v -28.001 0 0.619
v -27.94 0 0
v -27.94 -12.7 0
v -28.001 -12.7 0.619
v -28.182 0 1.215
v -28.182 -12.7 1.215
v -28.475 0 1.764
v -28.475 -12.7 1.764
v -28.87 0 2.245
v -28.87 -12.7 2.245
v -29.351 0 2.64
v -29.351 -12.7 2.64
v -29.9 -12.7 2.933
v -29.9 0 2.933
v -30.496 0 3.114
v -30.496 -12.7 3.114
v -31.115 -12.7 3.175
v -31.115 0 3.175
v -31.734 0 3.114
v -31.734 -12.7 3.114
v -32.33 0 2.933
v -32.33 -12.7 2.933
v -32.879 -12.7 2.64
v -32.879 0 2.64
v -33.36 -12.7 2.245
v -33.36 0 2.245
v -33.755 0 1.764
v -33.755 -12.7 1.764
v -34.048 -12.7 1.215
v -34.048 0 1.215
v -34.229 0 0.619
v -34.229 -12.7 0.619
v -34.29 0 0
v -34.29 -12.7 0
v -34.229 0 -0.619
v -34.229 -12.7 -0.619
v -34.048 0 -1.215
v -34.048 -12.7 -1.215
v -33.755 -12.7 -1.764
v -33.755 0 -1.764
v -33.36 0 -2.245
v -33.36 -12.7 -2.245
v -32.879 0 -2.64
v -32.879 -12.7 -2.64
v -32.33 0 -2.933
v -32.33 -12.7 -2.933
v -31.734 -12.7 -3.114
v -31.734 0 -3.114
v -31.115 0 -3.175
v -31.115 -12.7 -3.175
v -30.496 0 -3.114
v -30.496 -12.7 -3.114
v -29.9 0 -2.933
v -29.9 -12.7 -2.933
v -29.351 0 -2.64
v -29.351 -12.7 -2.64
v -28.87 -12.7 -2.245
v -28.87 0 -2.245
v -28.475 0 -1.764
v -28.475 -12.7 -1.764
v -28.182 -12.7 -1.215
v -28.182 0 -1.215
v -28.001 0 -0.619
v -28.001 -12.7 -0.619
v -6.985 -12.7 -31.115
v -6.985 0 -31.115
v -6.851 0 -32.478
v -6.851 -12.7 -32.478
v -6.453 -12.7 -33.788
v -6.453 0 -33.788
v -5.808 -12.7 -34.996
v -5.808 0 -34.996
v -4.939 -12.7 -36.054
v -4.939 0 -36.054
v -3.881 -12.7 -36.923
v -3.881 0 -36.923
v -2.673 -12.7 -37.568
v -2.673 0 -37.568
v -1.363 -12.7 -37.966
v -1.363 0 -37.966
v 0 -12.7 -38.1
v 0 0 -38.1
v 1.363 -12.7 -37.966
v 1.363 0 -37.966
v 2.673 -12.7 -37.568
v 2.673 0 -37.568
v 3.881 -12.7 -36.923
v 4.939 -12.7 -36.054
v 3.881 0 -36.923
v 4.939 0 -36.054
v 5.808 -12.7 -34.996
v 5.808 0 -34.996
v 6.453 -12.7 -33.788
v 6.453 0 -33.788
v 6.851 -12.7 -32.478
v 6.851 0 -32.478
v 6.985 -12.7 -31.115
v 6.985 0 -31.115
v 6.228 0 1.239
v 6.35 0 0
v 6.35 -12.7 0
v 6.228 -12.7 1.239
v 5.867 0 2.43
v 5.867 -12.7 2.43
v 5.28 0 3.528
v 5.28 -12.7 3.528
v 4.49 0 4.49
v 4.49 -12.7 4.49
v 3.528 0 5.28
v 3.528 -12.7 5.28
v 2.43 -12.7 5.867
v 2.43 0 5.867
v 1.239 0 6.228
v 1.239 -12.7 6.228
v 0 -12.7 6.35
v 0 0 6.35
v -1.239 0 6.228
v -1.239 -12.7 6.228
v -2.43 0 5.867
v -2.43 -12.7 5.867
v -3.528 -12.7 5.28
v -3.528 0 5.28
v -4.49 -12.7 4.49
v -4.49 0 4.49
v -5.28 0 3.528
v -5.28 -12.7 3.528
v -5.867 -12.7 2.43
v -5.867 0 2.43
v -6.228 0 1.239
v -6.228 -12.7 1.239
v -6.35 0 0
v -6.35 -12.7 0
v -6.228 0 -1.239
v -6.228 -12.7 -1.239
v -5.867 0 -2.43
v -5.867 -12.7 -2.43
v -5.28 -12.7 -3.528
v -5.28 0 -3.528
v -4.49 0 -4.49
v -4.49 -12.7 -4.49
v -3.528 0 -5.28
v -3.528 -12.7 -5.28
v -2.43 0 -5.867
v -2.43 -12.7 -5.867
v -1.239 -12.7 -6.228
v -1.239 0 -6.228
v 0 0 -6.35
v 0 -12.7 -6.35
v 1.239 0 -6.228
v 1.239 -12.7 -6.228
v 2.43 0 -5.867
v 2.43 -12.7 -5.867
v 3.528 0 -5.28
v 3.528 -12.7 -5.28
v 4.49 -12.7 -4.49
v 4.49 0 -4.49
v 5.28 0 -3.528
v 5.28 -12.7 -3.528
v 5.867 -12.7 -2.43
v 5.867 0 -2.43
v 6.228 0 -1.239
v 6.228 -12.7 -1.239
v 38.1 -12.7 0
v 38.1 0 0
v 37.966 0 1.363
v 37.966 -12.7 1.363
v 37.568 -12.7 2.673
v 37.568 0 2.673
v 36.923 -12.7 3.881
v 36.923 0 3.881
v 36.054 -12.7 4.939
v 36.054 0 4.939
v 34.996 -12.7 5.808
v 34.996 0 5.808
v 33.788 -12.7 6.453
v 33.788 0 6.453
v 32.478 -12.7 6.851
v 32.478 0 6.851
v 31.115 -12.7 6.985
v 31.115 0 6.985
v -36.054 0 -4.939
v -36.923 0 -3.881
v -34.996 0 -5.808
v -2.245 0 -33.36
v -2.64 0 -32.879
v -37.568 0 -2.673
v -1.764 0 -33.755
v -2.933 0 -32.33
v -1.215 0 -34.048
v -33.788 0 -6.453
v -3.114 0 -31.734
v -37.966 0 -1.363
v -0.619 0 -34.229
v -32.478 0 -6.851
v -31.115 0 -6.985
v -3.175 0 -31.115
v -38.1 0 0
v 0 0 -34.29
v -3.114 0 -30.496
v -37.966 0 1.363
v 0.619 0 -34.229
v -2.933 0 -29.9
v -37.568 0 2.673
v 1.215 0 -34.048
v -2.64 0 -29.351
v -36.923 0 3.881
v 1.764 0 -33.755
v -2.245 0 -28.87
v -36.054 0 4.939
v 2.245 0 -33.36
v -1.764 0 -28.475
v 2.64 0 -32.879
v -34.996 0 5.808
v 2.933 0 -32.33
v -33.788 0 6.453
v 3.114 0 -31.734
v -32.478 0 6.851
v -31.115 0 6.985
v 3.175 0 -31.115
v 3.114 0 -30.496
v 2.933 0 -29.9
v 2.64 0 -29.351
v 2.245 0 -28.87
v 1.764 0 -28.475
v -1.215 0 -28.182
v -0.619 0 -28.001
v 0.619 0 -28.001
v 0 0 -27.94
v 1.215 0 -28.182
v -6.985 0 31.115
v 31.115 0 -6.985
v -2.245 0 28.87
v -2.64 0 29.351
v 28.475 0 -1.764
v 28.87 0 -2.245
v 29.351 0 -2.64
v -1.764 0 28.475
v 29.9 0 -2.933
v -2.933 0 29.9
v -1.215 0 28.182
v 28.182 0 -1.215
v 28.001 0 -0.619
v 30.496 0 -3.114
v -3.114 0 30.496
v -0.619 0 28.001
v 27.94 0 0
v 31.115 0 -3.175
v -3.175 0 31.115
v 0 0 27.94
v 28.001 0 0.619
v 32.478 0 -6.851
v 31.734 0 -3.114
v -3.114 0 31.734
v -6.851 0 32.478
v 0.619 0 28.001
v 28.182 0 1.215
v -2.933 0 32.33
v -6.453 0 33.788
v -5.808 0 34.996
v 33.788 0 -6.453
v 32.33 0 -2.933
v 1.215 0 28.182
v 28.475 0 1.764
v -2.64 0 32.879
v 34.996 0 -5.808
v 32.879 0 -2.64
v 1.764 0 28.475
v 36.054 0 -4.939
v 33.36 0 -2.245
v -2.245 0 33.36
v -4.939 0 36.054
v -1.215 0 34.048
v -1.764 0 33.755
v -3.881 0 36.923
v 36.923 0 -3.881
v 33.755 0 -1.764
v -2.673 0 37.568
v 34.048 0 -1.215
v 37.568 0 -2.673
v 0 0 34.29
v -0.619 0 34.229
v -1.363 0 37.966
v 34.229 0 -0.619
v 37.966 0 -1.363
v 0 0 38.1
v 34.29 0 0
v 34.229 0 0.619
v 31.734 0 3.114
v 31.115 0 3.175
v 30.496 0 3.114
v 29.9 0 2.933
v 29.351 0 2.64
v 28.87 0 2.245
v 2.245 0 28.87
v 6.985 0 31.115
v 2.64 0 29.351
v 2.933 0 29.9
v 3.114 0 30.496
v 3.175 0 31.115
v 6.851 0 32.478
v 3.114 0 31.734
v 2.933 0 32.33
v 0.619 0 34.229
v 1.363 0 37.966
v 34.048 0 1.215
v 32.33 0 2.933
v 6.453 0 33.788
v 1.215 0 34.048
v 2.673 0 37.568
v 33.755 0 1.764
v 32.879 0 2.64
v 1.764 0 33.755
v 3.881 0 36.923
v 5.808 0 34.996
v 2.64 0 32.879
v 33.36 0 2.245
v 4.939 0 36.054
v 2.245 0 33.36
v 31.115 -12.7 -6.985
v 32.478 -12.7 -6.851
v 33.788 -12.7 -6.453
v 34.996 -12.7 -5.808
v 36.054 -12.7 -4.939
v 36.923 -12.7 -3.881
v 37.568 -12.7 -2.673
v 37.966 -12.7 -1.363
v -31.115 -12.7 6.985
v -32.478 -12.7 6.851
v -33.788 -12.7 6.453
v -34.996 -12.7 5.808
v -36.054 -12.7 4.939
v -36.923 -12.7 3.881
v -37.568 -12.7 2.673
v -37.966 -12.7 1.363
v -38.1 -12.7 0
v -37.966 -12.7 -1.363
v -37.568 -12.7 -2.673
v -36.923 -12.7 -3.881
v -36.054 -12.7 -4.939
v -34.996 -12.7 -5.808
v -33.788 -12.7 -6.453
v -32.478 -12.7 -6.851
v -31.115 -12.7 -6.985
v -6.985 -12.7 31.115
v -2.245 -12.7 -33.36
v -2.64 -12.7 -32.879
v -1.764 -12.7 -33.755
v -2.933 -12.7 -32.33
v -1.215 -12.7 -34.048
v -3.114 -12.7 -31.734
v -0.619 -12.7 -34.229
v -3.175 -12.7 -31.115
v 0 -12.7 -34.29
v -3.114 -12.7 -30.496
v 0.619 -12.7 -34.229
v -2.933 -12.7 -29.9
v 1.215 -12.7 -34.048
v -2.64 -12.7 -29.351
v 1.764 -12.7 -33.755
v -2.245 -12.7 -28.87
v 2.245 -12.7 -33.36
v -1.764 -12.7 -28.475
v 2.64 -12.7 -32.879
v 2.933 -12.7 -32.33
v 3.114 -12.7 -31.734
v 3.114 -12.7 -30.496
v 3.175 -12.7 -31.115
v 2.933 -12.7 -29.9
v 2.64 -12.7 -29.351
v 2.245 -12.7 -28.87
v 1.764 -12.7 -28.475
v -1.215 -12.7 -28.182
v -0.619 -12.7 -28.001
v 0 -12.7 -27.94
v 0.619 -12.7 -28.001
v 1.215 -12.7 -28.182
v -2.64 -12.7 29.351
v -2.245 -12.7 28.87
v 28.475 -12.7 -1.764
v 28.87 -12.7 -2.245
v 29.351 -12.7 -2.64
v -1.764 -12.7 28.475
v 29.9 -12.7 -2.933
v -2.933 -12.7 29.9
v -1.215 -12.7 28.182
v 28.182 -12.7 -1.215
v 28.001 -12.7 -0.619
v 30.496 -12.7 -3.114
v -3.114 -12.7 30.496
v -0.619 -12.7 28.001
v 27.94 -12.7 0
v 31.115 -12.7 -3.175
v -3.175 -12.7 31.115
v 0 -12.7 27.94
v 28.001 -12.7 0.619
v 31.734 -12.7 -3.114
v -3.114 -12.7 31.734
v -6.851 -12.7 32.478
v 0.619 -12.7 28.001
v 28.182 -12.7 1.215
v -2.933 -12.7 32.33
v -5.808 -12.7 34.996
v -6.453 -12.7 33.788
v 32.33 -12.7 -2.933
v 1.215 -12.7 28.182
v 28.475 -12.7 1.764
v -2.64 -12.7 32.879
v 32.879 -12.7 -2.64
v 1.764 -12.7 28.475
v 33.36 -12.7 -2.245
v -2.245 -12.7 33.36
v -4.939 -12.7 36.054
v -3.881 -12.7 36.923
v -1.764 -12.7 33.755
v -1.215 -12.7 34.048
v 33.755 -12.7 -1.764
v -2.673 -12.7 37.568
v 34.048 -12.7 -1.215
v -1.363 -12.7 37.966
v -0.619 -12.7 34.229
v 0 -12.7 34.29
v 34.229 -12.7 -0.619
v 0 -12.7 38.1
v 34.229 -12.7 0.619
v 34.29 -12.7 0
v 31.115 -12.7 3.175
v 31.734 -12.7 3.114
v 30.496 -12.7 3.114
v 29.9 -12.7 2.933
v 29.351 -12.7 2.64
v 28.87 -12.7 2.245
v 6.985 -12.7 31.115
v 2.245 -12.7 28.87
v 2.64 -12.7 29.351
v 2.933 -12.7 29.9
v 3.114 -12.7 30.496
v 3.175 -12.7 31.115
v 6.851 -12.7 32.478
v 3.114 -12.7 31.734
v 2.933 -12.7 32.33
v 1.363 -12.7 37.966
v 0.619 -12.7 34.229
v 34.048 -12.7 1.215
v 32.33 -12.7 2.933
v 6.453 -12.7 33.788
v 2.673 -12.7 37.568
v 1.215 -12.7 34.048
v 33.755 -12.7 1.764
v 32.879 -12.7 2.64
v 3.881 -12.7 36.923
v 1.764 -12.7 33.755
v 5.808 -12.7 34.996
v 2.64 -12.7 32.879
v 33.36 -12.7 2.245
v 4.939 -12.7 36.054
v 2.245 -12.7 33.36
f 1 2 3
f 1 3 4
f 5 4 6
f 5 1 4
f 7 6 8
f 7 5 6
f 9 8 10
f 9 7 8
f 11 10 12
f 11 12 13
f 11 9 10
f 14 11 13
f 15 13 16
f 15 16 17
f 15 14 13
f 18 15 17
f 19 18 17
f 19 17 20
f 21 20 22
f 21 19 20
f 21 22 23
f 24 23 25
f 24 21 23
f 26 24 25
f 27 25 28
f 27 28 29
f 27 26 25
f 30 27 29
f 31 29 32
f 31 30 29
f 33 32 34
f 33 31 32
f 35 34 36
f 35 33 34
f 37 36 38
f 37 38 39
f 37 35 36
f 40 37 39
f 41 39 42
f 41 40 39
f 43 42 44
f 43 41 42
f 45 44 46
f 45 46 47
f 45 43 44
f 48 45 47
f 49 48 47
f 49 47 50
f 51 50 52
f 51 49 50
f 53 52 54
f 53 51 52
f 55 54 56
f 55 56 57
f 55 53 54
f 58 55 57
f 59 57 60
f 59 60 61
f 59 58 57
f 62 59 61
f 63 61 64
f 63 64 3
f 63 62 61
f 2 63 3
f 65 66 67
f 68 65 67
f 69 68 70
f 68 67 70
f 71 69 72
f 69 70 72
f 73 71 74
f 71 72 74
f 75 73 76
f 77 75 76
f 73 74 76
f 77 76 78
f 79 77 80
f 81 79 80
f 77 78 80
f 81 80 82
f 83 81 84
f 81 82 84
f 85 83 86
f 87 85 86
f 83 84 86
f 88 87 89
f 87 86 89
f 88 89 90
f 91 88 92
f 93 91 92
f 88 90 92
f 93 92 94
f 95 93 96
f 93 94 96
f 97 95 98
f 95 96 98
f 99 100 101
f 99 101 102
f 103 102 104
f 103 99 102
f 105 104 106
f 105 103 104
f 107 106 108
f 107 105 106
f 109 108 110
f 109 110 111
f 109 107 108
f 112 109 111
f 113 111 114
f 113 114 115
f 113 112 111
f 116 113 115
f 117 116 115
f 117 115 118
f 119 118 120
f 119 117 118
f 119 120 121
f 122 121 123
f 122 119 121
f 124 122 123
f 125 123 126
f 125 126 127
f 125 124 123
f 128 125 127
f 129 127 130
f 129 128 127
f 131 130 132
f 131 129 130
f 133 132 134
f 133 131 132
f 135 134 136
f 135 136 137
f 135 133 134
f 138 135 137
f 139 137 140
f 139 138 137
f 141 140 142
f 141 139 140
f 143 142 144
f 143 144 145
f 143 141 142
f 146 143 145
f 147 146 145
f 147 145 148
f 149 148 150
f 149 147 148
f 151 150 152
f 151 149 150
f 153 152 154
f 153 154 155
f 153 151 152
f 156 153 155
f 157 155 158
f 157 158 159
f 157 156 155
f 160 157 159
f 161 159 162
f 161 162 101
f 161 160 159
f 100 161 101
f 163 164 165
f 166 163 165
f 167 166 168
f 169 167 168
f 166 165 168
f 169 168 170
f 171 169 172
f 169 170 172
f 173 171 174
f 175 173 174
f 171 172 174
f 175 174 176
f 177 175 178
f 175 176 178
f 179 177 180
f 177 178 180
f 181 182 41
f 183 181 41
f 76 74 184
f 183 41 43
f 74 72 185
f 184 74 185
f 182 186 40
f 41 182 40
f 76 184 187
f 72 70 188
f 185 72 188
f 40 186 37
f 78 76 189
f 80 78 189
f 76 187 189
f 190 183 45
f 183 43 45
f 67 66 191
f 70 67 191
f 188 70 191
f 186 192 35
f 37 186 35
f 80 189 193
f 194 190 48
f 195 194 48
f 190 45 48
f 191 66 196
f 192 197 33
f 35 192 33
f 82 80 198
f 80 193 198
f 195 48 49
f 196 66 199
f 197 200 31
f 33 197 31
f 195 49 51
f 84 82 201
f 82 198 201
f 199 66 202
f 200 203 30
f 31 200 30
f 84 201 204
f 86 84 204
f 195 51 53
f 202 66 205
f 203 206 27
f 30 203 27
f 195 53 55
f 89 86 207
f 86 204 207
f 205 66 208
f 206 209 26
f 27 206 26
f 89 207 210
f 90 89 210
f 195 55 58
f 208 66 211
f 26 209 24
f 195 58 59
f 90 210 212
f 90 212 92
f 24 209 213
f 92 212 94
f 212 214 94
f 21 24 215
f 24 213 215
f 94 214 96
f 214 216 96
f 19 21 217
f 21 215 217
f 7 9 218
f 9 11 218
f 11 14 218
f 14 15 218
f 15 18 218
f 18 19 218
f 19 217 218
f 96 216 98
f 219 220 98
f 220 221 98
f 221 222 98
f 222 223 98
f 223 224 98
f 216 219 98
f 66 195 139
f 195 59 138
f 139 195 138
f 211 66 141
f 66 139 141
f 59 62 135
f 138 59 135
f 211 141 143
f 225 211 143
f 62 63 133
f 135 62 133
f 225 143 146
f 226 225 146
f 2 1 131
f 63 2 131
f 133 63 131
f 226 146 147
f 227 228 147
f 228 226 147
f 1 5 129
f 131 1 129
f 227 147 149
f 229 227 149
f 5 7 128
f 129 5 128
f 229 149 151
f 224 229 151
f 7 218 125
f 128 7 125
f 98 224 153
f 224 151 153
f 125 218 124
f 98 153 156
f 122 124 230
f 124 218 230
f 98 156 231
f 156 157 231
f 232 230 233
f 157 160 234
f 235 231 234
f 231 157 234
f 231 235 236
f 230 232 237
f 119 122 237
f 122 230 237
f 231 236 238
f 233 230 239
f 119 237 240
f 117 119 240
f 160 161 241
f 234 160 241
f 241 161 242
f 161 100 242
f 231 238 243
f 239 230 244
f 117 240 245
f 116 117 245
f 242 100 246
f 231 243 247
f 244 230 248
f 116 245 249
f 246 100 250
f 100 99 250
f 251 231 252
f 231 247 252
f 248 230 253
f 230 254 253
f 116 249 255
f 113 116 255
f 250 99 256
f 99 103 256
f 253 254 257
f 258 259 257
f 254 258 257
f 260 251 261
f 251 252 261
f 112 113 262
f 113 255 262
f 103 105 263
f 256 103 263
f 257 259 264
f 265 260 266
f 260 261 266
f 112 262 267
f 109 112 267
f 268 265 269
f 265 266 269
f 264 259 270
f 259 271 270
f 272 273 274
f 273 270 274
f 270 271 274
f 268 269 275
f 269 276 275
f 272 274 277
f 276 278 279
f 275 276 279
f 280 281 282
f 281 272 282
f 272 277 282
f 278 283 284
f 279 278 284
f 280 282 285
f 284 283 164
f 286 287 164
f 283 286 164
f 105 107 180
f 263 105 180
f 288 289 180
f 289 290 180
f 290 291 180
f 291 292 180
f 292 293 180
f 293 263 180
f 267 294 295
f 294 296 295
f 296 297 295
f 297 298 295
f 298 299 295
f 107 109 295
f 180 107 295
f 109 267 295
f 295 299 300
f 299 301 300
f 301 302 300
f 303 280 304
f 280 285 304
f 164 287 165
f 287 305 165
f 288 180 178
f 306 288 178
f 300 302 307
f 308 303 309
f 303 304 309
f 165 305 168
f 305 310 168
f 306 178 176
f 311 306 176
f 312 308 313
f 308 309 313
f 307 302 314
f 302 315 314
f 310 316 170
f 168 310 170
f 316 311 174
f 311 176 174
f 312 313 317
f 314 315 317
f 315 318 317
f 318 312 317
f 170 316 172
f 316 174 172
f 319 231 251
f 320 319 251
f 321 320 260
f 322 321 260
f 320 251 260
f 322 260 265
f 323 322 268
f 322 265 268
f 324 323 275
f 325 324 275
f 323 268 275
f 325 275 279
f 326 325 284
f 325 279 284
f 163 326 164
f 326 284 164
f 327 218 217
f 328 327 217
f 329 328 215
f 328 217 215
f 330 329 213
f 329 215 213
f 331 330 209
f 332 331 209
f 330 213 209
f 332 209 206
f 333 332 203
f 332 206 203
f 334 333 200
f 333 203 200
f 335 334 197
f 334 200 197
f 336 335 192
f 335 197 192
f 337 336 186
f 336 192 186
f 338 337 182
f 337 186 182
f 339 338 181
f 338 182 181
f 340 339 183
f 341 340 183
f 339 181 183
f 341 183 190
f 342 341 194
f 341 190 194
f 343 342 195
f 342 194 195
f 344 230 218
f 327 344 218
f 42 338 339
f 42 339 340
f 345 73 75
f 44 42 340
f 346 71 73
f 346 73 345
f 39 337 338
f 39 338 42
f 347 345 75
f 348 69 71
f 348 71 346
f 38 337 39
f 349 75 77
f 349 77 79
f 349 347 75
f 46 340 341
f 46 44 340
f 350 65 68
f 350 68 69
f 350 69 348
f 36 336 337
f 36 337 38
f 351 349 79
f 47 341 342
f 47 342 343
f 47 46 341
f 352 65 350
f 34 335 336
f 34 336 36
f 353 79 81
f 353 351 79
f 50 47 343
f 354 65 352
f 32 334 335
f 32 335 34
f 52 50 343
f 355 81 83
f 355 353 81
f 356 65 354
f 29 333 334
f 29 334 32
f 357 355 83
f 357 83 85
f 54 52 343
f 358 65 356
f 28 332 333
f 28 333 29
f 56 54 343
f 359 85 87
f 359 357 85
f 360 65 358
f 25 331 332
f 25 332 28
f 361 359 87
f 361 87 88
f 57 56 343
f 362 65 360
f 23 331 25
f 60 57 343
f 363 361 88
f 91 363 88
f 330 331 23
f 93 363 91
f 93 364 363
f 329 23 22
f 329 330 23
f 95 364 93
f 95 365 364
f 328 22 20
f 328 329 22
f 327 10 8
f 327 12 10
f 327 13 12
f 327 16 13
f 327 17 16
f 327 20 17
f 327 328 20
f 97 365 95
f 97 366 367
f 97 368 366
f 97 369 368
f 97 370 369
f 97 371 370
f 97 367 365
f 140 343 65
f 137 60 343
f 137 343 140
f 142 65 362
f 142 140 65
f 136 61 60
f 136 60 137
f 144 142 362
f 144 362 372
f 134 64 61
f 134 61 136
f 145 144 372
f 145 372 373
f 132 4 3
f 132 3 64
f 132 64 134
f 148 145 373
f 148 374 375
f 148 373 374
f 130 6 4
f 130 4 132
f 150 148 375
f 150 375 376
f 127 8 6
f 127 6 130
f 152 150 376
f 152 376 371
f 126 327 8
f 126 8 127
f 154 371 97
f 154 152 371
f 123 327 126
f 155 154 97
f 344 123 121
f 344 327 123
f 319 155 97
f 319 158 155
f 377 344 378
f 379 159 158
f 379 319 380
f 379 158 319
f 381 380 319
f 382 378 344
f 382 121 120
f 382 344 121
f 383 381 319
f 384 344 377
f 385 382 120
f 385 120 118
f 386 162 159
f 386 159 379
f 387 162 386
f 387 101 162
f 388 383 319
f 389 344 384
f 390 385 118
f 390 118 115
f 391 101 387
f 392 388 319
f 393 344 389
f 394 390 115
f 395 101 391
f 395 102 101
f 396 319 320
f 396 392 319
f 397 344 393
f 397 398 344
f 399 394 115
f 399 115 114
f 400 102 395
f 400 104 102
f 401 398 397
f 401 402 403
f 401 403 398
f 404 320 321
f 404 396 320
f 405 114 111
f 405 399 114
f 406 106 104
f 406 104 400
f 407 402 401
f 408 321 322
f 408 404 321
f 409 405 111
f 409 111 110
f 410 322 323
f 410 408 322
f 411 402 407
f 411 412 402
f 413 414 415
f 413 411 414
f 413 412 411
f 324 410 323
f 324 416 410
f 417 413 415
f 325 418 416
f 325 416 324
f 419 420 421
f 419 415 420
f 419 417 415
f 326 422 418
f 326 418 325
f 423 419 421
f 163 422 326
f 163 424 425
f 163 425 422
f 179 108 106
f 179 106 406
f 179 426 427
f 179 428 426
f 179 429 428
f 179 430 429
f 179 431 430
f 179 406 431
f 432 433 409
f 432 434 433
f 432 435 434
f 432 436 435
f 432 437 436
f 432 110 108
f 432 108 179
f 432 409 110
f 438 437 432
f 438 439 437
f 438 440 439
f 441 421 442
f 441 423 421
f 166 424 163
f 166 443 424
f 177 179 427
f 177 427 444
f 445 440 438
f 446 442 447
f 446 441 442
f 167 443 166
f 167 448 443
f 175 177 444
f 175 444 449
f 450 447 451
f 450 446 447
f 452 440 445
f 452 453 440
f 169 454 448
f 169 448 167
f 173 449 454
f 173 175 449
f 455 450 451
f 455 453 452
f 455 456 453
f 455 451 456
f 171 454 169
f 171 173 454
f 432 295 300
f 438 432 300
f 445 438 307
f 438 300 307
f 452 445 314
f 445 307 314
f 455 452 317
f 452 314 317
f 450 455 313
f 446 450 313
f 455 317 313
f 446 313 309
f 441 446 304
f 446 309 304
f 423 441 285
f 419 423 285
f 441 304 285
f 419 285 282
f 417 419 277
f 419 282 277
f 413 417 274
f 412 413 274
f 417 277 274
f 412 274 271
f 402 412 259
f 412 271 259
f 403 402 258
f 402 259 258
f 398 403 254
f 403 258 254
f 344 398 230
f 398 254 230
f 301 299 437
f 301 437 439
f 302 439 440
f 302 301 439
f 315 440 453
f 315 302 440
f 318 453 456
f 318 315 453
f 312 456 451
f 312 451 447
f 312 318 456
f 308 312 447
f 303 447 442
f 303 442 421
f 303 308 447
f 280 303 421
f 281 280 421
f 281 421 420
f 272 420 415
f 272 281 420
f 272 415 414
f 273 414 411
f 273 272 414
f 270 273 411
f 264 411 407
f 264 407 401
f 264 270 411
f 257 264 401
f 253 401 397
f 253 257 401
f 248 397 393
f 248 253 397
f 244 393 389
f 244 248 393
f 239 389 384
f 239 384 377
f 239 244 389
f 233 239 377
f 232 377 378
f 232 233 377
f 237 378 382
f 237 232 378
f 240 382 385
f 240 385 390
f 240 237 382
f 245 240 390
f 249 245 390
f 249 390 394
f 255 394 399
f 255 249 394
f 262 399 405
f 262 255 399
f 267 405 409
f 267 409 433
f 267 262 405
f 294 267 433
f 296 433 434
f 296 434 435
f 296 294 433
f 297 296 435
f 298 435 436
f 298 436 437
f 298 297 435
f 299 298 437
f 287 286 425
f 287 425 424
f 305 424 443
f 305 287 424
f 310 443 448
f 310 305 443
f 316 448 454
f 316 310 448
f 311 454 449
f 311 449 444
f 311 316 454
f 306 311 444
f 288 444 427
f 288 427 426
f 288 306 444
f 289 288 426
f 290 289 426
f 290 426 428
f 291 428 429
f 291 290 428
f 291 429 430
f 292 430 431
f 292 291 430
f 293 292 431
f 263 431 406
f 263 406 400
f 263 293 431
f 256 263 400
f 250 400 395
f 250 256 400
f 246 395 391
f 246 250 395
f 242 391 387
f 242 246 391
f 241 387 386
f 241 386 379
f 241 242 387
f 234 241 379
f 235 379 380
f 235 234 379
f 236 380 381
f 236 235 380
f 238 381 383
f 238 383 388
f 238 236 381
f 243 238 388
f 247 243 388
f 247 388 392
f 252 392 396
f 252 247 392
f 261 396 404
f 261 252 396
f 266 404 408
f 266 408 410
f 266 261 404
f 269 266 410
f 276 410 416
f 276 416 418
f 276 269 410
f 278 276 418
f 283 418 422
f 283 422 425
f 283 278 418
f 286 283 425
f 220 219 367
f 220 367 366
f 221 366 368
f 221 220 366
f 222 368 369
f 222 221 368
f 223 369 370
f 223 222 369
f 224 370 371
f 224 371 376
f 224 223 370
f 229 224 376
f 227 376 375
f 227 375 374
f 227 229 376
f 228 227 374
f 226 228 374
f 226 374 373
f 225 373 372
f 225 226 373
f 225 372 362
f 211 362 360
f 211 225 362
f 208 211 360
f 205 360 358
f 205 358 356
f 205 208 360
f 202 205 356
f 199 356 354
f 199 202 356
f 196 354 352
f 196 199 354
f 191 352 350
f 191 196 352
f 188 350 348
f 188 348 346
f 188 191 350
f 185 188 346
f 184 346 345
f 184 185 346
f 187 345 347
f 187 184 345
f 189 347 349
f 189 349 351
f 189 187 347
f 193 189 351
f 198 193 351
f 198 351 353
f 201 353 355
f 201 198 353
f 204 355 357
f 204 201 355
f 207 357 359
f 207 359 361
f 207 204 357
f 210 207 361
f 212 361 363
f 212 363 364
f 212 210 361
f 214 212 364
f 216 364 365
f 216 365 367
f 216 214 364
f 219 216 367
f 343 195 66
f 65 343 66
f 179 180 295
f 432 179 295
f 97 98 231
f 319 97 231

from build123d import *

# Parameters (mm, degrees)
F0_R     = 3.175
F0_R_2   = 12.7
F0_R_3   = 6.35
F1_DEPTH = 12.7


with BuildPart() as f1:
    # F0 (on Front) → F1 (new body)
    with BuildSketch(Plane.XZ):
        with BuildLine():
            ThreePointArc((-31.115, -6.985), (-26.175859, -4.939141), (-24.13, 0))
            ThreePointArc((-24.13, 0), (-26.175859, 4.939141), (-31.115, 6.985))
            ThreePointArc((-31.115, 6.985), (-38.1, 0), (-31.115, -6.985))
        make_face()
        with Locations((-31.115, 0)):
            Circle(F0_R, mode=Mode.SUBTRACT)
        with BuildLine():
            ThreePointArc((-31.115, 6.985), (-26.175859, 4.939141), (-24.13, 0))
            ThreePointArc((-24.13, 0), (-26.175859, -4.939141), (-31.115, -6.985))
            Line((-31.115, -6.985), (-6.985, -31.115))
            ThreePointArc((-6.985, -31.115), (0, -24.13), (6.985, -31.115))
            Line((6.985, -31.115), (31.115, -6.985))
            ThreePointArc((31.115, -6.985), (24.13, 0), (31.115, 6.985))
            Line((31.115, 6.985), (6.985, 31.115))
            ThreePointArc((6.985, 31.115), (0, 24.13), (-6.985, 31.115))
            Line((-6.985, 31.115), (-31.115, 6.985))
        make_face()
        Circle(F0_R_2, mode=Mode.SUBTRACT)
        with BuildLine():
            ThreePointArc((6.985, 31.115), (0, 38.1), (-6.985, 31.115))
            ThreePointArc((-6.985, 31.115), (0, 24.13), (6.985, 31.115))
        make_face()
        with Locations((0, 31.115)):
            Circle(F0_R, mode=Mode.SUBTRACT)
        with BuildLine():
            ThreePointArc((6.985, -31.115), (0, -24.13), (-6.985, -31.115))
            ThreePointArc((-6.985, -31.115), (0, -38.1), (6.985, -31.115))
        make_face()
        with Locations((0, -31.115)):
            Circle(F0_R, mode=Mode.SUBTRACT)
        with BuildLine():
            ThreePointArc((38.1, 0), (36.054141, 4.939141), (31.115, 6.985))
            ThreePointArc((31.115, 6.985), (24.13, 0), (31.115, -6.985))
            ThreePointArc((31.115, -6.985), (36.054141, -4.939141), (38.1, 0))
        make_face()
        with Locations((31.115, 0)):
            Circle(F0_R, mode=Mode.SUBTRACT)
        Circle(F0_R_2)
        Circle(F0_R_3, mode=Mode.SUBTRACT)
    extrude(amount=F1_DEPTH)


solid = f1.part
